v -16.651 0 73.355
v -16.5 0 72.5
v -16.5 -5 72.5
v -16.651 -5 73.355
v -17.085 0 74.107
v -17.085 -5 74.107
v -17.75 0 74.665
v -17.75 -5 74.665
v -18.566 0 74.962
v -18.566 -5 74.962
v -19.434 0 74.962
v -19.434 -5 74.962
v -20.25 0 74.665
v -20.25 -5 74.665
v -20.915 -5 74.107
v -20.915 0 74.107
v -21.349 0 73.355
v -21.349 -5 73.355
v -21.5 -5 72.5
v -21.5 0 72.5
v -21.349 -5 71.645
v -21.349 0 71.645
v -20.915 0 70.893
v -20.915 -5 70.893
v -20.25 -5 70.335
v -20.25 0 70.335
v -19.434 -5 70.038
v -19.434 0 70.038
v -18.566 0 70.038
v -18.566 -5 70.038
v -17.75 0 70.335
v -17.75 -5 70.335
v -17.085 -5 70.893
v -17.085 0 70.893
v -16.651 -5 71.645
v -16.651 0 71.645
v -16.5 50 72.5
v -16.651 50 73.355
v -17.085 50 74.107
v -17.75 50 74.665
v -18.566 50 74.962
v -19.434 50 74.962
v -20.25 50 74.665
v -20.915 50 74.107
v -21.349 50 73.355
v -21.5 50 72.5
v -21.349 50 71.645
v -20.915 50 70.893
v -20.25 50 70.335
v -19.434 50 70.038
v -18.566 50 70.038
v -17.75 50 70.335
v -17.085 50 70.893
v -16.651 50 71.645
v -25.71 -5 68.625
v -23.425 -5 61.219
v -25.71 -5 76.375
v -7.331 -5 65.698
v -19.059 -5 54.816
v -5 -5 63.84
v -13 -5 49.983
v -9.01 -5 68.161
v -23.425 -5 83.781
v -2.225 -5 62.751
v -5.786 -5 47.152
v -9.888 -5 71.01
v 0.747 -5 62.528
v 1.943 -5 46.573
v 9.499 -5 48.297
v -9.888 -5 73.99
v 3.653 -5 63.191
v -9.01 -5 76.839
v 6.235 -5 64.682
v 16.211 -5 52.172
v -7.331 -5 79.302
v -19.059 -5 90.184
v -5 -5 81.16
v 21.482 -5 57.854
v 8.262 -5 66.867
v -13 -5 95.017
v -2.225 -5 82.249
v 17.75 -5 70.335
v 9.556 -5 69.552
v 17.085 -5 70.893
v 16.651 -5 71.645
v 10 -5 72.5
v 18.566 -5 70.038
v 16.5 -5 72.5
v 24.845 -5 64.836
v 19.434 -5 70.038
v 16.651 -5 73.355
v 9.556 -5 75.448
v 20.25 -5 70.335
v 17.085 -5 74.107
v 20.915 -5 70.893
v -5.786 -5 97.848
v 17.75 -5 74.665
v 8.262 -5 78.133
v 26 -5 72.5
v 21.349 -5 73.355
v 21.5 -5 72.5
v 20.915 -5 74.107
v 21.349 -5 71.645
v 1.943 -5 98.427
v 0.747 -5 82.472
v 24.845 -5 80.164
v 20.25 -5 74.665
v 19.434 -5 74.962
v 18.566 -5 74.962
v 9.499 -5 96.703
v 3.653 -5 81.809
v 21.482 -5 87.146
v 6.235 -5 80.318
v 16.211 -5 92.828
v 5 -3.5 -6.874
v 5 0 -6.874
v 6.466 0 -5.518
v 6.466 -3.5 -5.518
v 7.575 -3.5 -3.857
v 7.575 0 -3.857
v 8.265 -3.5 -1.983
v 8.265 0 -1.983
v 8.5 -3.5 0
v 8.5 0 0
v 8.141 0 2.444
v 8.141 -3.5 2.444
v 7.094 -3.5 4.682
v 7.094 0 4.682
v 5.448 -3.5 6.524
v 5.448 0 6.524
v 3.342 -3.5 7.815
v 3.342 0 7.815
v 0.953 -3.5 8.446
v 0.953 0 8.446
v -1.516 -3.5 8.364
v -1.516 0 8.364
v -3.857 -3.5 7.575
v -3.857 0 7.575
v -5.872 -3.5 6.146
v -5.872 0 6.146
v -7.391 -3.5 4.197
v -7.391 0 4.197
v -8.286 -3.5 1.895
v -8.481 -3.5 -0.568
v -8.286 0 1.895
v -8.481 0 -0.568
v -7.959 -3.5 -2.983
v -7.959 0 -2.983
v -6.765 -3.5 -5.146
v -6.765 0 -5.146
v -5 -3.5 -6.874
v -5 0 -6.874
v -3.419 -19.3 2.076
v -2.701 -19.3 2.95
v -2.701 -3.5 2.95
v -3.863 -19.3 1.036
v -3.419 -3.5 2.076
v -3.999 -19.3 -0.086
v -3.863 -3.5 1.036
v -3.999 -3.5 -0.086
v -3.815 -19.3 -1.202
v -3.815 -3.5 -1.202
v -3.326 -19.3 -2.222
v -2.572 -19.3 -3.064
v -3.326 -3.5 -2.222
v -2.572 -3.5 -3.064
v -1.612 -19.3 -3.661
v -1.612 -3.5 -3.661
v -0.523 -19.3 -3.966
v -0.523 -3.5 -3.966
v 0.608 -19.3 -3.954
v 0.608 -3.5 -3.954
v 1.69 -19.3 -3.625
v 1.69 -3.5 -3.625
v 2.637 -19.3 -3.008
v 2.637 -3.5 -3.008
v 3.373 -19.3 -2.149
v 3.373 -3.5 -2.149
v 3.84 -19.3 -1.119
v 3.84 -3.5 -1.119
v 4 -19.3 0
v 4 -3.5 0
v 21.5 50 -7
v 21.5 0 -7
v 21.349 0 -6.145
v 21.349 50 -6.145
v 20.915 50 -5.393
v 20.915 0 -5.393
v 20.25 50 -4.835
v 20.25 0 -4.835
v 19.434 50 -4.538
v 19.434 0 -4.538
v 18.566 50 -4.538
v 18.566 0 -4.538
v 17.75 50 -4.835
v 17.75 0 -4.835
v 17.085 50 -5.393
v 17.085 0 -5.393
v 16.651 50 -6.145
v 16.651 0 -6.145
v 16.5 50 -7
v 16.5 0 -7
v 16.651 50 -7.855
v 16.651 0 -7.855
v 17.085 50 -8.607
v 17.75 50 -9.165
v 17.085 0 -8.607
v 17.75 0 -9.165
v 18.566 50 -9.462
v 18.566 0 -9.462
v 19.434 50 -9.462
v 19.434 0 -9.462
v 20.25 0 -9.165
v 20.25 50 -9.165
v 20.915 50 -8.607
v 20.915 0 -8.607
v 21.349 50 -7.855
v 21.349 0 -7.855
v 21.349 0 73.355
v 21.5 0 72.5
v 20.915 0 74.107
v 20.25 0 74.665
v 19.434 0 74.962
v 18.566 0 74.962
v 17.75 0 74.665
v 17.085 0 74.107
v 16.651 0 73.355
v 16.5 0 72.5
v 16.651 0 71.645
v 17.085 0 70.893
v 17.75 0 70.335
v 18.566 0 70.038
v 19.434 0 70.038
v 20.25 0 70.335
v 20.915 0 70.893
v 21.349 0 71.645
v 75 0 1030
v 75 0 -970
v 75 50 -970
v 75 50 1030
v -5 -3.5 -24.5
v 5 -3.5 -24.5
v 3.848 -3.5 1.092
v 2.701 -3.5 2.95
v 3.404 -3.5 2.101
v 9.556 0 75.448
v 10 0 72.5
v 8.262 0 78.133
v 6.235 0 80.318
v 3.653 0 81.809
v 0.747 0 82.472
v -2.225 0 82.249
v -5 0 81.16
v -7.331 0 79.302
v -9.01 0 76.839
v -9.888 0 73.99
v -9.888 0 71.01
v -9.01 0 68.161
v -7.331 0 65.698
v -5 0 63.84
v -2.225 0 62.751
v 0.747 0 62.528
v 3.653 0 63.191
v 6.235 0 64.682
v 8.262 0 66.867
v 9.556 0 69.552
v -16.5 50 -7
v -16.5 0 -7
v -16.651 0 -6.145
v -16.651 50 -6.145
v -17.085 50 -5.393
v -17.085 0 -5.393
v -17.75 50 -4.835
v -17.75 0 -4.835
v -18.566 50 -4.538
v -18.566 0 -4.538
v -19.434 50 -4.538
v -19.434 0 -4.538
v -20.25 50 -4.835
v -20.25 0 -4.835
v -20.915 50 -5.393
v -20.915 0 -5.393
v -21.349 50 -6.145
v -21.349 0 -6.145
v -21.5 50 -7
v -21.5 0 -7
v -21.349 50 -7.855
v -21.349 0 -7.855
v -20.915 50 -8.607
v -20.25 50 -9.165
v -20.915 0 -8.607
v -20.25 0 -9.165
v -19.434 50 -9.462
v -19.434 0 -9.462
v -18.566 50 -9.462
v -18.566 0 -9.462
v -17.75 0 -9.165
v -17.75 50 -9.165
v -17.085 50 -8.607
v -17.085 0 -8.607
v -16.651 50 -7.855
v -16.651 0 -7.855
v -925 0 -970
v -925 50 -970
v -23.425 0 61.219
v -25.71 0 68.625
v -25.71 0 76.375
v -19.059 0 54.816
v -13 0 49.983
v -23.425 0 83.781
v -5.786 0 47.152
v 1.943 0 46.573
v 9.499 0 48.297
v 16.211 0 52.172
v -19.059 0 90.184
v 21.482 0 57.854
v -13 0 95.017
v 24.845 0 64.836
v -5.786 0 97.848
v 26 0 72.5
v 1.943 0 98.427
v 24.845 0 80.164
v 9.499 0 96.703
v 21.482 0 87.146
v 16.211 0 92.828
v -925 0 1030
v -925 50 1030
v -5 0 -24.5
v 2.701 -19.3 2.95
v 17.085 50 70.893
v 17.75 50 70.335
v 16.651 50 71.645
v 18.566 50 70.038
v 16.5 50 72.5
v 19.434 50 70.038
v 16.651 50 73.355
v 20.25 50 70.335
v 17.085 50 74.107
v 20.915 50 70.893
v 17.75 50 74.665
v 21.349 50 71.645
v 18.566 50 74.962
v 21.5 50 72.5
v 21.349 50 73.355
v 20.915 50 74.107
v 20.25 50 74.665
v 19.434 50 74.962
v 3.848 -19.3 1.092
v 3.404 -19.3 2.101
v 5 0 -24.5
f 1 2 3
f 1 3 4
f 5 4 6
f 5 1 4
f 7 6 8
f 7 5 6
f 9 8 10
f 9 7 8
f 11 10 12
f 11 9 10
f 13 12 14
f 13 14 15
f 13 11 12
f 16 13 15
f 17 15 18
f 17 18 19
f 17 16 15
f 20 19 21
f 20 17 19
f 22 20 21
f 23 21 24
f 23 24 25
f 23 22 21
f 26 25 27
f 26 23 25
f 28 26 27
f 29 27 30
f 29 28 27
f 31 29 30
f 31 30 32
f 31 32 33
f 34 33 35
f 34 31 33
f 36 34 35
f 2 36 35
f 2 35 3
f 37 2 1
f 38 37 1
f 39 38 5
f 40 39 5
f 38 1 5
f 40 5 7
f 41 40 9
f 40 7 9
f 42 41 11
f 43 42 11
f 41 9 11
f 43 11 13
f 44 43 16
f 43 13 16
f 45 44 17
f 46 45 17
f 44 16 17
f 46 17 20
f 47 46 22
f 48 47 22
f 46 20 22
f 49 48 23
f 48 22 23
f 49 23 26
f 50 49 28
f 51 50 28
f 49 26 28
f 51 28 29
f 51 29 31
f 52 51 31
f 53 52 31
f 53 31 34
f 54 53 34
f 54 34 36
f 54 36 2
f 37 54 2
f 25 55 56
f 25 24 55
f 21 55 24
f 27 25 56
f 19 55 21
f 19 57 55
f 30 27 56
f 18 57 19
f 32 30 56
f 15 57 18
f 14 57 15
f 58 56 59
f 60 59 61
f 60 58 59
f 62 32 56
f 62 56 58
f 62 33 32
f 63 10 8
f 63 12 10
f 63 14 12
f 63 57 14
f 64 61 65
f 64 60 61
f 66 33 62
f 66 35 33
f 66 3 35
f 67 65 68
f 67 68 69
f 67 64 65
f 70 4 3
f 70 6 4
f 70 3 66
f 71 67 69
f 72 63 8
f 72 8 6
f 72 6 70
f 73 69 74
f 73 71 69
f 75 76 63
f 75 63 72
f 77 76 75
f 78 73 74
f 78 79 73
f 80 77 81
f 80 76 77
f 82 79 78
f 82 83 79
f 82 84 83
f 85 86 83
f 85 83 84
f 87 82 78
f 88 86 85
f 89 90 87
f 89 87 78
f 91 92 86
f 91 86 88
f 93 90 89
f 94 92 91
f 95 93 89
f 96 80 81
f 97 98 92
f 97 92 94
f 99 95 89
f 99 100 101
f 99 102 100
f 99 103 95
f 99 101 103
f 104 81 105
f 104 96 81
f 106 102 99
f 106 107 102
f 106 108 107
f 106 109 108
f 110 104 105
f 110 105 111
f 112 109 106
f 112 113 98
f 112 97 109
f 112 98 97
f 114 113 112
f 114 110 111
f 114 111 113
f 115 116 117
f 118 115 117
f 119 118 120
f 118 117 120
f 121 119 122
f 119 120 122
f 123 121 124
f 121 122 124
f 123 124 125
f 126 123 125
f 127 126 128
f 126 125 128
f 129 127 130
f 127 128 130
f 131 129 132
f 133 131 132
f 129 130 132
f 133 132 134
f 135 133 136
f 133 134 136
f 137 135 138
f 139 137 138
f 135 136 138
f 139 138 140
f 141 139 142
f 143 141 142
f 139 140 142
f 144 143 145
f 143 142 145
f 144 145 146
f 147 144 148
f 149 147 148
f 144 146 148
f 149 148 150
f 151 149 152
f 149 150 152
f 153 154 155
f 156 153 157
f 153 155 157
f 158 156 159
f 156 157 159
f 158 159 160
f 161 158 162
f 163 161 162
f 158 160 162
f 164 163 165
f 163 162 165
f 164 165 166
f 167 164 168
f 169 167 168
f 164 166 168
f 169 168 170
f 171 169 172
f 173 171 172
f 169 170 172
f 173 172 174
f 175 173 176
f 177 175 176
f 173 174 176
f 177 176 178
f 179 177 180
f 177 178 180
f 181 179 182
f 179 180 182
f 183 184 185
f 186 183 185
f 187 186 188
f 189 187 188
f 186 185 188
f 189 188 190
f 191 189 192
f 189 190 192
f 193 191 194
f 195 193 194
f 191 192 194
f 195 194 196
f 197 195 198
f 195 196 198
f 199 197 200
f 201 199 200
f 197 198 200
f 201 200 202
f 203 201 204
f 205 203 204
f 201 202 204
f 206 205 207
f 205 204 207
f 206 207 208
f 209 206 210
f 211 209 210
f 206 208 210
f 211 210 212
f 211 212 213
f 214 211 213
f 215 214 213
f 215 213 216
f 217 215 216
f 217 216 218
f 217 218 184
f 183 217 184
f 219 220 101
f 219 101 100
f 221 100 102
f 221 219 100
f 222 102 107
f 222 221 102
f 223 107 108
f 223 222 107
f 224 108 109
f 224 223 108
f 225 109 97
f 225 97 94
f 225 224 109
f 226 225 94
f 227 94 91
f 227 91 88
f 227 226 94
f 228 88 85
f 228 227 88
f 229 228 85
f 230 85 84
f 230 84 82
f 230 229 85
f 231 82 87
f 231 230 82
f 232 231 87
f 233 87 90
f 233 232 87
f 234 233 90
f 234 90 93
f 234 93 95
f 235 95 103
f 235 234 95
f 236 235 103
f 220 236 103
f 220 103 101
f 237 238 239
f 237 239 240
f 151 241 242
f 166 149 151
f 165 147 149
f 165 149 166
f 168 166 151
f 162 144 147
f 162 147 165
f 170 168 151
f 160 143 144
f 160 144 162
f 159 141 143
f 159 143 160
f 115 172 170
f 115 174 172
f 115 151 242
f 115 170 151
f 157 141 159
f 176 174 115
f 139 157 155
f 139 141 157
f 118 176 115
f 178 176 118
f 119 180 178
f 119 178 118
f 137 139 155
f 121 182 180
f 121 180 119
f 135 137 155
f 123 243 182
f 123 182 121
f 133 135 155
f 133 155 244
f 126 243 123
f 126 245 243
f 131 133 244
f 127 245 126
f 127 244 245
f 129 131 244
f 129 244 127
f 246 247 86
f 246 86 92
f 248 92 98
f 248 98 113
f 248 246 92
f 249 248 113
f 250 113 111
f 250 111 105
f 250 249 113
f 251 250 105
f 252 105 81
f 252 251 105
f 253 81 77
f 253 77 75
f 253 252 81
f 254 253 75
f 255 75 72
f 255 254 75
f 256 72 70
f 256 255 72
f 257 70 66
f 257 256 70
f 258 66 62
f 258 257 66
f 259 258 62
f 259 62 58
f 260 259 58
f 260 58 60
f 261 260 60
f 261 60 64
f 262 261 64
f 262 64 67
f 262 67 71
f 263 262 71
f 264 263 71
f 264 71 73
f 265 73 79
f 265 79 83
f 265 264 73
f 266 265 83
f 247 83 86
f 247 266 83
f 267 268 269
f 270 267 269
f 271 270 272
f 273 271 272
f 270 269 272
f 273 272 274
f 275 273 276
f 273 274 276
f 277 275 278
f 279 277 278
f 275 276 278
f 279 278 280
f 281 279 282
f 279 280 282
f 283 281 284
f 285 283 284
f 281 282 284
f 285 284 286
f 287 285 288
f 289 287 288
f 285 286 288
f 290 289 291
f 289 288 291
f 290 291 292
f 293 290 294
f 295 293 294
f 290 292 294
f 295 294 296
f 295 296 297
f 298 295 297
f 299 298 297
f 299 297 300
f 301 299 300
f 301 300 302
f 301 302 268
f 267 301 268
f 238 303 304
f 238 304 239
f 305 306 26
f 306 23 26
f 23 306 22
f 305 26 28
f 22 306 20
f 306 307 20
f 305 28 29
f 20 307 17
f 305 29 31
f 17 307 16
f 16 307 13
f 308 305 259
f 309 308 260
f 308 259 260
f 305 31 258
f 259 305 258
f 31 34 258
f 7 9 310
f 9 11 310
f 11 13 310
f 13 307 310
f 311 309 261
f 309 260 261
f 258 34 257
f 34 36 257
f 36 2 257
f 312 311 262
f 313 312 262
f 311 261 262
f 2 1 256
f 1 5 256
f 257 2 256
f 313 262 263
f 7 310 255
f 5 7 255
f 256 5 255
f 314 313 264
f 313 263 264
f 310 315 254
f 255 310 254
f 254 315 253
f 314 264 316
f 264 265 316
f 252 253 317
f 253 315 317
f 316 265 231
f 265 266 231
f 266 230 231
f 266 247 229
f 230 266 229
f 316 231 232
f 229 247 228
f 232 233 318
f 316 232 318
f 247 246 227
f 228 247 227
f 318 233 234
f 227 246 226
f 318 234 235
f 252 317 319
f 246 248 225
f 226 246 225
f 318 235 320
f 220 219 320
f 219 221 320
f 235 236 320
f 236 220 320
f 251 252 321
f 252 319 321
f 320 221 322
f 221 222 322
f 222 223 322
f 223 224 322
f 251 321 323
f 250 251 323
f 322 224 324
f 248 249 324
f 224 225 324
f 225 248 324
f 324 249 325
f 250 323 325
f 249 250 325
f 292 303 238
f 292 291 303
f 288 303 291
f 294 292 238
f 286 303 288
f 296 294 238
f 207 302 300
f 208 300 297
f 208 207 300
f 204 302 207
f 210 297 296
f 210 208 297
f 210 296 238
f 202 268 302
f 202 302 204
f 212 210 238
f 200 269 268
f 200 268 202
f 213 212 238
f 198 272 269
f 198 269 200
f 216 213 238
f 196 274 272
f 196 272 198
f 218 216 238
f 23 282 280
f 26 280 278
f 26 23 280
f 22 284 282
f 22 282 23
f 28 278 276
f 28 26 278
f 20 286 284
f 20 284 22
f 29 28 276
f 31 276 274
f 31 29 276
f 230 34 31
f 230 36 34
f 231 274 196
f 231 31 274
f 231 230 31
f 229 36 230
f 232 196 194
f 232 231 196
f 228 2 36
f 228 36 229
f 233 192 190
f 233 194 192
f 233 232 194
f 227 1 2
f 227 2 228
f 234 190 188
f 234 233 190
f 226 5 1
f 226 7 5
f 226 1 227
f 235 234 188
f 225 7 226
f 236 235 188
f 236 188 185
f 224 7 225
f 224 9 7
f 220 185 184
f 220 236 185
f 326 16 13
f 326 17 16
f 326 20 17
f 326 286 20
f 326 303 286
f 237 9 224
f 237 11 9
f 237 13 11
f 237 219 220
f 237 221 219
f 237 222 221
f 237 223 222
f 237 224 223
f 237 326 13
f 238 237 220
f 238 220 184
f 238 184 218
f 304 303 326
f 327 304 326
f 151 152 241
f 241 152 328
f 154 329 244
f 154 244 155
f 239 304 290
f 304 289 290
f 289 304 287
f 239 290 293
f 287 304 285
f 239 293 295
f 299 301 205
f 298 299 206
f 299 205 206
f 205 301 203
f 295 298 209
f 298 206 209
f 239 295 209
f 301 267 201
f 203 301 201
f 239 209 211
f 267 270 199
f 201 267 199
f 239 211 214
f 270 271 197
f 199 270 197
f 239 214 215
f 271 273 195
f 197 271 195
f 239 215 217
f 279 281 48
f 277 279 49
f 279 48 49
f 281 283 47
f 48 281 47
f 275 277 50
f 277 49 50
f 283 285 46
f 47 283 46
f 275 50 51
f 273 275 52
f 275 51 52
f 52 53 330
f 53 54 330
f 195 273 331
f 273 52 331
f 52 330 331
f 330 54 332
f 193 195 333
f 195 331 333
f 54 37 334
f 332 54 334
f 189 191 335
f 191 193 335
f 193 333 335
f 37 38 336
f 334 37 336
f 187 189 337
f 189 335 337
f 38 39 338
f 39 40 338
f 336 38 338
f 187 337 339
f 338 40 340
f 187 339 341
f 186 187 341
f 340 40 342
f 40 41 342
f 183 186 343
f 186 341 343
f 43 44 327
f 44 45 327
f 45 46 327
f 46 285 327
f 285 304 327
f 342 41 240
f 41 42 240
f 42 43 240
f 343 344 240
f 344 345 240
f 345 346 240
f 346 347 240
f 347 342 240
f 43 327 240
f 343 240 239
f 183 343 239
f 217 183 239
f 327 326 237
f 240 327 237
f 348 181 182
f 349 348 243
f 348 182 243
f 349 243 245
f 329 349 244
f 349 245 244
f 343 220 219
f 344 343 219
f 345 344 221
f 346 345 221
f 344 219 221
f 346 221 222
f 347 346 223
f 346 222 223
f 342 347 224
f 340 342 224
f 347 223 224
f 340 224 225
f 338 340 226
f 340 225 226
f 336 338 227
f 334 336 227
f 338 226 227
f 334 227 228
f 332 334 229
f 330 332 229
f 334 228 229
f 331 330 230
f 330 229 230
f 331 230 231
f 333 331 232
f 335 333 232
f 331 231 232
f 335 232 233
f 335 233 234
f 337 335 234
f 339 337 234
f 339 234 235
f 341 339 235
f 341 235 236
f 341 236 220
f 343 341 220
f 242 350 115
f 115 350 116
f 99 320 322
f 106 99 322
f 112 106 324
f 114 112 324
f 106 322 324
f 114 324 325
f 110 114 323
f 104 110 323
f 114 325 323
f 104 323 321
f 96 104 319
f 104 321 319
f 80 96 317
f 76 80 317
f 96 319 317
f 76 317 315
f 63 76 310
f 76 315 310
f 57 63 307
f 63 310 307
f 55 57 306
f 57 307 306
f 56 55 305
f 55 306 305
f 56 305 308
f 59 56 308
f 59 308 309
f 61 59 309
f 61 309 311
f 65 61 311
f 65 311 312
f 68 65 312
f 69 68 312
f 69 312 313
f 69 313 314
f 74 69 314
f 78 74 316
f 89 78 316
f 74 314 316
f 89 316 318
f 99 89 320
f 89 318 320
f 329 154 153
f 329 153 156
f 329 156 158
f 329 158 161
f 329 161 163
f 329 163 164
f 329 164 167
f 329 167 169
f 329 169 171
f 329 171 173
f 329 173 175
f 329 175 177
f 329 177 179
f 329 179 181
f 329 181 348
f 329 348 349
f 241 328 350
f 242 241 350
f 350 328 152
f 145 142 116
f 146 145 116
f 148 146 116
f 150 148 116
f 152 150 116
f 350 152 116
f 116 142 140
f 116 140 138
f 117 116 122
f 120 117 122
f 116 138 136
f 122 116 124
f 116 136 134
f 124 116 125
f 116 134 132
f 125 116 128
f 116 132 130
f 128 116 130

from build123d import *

# Parameters (mm, degrees)
F0_W     = 1000
F0_H     = 2000
F1_DEPTH = 50
F3_DEPTH = 3.5
F2_R     = 26
F2_R_2   = 2.5
F2_R_3   = 10
F4_DEPTH = 5
F5_DEPTH = 50
F7_DEPTH = 15.8


with BuildPart() as f1:
    # F0 (on Front) → F1 (new body)
    with BuildSketch(Plane.XZ):
        with Locations((-425, 30)):
            Rectangle(F0_W, F0_H)
    extrude(amount=-F1_DEPTH)

    # F2 (on Front) → F5 (cut, through all)
    with BuildSketch(Plane.XZ):
        with Locations((-19, -7)):
            Circle(F2_R_2)
        with Locations((19, -7)):
            Circle(F2_R_2)
        with Locations((19, 72.5)):
            Circle(F2_R_2)
        with Locations((-19, 72.5)):
            Circle(F2_R_2)
    extrude(amount=-F5_DEPTH, mode=Mode.SUBTRACT)


with BuildPart() as f3:
    # F2 (on Front) → F3 (new body)
    with BuildSketch(Plane.XZ):
        with BuildLine():
            ThreePointArc((5, -6.8738635424), (7.5746287038, -3.8568121551), (8.5, 0))
            ThreePointArc((8.5, 0), (-3.8568121551, 7.5746287038), (-5, -6.8738635424))
            Line((-5, -6.8738635424), (-5, 0))
            Line((-5, 0), (-4, 0))
            ThreePointArc((-4, 0), (0, 4), (4, 0))
            Line((4, 0), (5, 0))
            Line((5, 0), (5, -6.8738635424))
        make_face()
        with BuildLine():
            Line((-5, 0), (-5, -6.8738635424))
            ThreePointArc((-5, -6.8738635424), (0, -8.5), (5, -6.8738635424))
            Line((5, -6.8738635424), (5, 0))
            Line((5, 0), (4, 0))
            ThreePointArc((4, 0), (0, -4), (-4, 0))
            Line((-4, 0), (-5, 0))
        make_face()
        with BuildLine():
            ThreePointArc((5, -6.8738635424), (0, -8.5), (-5, -6.8738635424))
            Line((-5, -6.8738635424), (-5, -24.5))
            Line((-5, -24.5), (5, -24.5))
            Line((5, -24.5), (5, -6.8738635424))
        make_face()
        with BuildLine():
            Line((4, 0), (-4, 0))
            ThreePointArc((-4, 0), (0, -4), (4, 0))
        make_face()
        with BuildLine():
            ThreePointArc((4, 0), (0, 4), (-4, 0))
            Line((-4, 0), (4, 0))
        make_face()
    extrude(amount=F3_DEPTH)

    # F6 (on face) → F7 (join)
    with BuildSketch(Plane.XZ.offset(3.5)):
        with BuildLine():
            ThreePointArc((-2.7013885318, 2.95), (-1.6115901887, -3.6609803419), (4, 0))
            ThreePointArc((4, 0), (3.6609803419, 1.6115901887), (2.7013885318, 2.95))
            Line((2.7013885318, 2.95), (-2.7013885318, 2.95))
        make_face()
    extrude(amount=F7_DEPTH)


with BuildPart() as f4:
    # F2 (on Front) → F4 (new body)
    with BuildSketch(Plane.XZ):
        with Locations((0, 72.5)):
            Circle(F2_R)
        with Locations((-19, 72.5)):
            Circle(F2_R_2, mode=Mode.SUBTRACT)
        with Locations((0, 72.5)):
            Circle(F2_R_3, mode=Mode.SUBTRACT)
        with Locations((19, 72.5)):
            Circle(F2_R_2, mode=Mode.SUBTRACT)
    extrude(amount=F4_DEPTH)


solid = Compound([f1.part, f3.part, f4.part])
